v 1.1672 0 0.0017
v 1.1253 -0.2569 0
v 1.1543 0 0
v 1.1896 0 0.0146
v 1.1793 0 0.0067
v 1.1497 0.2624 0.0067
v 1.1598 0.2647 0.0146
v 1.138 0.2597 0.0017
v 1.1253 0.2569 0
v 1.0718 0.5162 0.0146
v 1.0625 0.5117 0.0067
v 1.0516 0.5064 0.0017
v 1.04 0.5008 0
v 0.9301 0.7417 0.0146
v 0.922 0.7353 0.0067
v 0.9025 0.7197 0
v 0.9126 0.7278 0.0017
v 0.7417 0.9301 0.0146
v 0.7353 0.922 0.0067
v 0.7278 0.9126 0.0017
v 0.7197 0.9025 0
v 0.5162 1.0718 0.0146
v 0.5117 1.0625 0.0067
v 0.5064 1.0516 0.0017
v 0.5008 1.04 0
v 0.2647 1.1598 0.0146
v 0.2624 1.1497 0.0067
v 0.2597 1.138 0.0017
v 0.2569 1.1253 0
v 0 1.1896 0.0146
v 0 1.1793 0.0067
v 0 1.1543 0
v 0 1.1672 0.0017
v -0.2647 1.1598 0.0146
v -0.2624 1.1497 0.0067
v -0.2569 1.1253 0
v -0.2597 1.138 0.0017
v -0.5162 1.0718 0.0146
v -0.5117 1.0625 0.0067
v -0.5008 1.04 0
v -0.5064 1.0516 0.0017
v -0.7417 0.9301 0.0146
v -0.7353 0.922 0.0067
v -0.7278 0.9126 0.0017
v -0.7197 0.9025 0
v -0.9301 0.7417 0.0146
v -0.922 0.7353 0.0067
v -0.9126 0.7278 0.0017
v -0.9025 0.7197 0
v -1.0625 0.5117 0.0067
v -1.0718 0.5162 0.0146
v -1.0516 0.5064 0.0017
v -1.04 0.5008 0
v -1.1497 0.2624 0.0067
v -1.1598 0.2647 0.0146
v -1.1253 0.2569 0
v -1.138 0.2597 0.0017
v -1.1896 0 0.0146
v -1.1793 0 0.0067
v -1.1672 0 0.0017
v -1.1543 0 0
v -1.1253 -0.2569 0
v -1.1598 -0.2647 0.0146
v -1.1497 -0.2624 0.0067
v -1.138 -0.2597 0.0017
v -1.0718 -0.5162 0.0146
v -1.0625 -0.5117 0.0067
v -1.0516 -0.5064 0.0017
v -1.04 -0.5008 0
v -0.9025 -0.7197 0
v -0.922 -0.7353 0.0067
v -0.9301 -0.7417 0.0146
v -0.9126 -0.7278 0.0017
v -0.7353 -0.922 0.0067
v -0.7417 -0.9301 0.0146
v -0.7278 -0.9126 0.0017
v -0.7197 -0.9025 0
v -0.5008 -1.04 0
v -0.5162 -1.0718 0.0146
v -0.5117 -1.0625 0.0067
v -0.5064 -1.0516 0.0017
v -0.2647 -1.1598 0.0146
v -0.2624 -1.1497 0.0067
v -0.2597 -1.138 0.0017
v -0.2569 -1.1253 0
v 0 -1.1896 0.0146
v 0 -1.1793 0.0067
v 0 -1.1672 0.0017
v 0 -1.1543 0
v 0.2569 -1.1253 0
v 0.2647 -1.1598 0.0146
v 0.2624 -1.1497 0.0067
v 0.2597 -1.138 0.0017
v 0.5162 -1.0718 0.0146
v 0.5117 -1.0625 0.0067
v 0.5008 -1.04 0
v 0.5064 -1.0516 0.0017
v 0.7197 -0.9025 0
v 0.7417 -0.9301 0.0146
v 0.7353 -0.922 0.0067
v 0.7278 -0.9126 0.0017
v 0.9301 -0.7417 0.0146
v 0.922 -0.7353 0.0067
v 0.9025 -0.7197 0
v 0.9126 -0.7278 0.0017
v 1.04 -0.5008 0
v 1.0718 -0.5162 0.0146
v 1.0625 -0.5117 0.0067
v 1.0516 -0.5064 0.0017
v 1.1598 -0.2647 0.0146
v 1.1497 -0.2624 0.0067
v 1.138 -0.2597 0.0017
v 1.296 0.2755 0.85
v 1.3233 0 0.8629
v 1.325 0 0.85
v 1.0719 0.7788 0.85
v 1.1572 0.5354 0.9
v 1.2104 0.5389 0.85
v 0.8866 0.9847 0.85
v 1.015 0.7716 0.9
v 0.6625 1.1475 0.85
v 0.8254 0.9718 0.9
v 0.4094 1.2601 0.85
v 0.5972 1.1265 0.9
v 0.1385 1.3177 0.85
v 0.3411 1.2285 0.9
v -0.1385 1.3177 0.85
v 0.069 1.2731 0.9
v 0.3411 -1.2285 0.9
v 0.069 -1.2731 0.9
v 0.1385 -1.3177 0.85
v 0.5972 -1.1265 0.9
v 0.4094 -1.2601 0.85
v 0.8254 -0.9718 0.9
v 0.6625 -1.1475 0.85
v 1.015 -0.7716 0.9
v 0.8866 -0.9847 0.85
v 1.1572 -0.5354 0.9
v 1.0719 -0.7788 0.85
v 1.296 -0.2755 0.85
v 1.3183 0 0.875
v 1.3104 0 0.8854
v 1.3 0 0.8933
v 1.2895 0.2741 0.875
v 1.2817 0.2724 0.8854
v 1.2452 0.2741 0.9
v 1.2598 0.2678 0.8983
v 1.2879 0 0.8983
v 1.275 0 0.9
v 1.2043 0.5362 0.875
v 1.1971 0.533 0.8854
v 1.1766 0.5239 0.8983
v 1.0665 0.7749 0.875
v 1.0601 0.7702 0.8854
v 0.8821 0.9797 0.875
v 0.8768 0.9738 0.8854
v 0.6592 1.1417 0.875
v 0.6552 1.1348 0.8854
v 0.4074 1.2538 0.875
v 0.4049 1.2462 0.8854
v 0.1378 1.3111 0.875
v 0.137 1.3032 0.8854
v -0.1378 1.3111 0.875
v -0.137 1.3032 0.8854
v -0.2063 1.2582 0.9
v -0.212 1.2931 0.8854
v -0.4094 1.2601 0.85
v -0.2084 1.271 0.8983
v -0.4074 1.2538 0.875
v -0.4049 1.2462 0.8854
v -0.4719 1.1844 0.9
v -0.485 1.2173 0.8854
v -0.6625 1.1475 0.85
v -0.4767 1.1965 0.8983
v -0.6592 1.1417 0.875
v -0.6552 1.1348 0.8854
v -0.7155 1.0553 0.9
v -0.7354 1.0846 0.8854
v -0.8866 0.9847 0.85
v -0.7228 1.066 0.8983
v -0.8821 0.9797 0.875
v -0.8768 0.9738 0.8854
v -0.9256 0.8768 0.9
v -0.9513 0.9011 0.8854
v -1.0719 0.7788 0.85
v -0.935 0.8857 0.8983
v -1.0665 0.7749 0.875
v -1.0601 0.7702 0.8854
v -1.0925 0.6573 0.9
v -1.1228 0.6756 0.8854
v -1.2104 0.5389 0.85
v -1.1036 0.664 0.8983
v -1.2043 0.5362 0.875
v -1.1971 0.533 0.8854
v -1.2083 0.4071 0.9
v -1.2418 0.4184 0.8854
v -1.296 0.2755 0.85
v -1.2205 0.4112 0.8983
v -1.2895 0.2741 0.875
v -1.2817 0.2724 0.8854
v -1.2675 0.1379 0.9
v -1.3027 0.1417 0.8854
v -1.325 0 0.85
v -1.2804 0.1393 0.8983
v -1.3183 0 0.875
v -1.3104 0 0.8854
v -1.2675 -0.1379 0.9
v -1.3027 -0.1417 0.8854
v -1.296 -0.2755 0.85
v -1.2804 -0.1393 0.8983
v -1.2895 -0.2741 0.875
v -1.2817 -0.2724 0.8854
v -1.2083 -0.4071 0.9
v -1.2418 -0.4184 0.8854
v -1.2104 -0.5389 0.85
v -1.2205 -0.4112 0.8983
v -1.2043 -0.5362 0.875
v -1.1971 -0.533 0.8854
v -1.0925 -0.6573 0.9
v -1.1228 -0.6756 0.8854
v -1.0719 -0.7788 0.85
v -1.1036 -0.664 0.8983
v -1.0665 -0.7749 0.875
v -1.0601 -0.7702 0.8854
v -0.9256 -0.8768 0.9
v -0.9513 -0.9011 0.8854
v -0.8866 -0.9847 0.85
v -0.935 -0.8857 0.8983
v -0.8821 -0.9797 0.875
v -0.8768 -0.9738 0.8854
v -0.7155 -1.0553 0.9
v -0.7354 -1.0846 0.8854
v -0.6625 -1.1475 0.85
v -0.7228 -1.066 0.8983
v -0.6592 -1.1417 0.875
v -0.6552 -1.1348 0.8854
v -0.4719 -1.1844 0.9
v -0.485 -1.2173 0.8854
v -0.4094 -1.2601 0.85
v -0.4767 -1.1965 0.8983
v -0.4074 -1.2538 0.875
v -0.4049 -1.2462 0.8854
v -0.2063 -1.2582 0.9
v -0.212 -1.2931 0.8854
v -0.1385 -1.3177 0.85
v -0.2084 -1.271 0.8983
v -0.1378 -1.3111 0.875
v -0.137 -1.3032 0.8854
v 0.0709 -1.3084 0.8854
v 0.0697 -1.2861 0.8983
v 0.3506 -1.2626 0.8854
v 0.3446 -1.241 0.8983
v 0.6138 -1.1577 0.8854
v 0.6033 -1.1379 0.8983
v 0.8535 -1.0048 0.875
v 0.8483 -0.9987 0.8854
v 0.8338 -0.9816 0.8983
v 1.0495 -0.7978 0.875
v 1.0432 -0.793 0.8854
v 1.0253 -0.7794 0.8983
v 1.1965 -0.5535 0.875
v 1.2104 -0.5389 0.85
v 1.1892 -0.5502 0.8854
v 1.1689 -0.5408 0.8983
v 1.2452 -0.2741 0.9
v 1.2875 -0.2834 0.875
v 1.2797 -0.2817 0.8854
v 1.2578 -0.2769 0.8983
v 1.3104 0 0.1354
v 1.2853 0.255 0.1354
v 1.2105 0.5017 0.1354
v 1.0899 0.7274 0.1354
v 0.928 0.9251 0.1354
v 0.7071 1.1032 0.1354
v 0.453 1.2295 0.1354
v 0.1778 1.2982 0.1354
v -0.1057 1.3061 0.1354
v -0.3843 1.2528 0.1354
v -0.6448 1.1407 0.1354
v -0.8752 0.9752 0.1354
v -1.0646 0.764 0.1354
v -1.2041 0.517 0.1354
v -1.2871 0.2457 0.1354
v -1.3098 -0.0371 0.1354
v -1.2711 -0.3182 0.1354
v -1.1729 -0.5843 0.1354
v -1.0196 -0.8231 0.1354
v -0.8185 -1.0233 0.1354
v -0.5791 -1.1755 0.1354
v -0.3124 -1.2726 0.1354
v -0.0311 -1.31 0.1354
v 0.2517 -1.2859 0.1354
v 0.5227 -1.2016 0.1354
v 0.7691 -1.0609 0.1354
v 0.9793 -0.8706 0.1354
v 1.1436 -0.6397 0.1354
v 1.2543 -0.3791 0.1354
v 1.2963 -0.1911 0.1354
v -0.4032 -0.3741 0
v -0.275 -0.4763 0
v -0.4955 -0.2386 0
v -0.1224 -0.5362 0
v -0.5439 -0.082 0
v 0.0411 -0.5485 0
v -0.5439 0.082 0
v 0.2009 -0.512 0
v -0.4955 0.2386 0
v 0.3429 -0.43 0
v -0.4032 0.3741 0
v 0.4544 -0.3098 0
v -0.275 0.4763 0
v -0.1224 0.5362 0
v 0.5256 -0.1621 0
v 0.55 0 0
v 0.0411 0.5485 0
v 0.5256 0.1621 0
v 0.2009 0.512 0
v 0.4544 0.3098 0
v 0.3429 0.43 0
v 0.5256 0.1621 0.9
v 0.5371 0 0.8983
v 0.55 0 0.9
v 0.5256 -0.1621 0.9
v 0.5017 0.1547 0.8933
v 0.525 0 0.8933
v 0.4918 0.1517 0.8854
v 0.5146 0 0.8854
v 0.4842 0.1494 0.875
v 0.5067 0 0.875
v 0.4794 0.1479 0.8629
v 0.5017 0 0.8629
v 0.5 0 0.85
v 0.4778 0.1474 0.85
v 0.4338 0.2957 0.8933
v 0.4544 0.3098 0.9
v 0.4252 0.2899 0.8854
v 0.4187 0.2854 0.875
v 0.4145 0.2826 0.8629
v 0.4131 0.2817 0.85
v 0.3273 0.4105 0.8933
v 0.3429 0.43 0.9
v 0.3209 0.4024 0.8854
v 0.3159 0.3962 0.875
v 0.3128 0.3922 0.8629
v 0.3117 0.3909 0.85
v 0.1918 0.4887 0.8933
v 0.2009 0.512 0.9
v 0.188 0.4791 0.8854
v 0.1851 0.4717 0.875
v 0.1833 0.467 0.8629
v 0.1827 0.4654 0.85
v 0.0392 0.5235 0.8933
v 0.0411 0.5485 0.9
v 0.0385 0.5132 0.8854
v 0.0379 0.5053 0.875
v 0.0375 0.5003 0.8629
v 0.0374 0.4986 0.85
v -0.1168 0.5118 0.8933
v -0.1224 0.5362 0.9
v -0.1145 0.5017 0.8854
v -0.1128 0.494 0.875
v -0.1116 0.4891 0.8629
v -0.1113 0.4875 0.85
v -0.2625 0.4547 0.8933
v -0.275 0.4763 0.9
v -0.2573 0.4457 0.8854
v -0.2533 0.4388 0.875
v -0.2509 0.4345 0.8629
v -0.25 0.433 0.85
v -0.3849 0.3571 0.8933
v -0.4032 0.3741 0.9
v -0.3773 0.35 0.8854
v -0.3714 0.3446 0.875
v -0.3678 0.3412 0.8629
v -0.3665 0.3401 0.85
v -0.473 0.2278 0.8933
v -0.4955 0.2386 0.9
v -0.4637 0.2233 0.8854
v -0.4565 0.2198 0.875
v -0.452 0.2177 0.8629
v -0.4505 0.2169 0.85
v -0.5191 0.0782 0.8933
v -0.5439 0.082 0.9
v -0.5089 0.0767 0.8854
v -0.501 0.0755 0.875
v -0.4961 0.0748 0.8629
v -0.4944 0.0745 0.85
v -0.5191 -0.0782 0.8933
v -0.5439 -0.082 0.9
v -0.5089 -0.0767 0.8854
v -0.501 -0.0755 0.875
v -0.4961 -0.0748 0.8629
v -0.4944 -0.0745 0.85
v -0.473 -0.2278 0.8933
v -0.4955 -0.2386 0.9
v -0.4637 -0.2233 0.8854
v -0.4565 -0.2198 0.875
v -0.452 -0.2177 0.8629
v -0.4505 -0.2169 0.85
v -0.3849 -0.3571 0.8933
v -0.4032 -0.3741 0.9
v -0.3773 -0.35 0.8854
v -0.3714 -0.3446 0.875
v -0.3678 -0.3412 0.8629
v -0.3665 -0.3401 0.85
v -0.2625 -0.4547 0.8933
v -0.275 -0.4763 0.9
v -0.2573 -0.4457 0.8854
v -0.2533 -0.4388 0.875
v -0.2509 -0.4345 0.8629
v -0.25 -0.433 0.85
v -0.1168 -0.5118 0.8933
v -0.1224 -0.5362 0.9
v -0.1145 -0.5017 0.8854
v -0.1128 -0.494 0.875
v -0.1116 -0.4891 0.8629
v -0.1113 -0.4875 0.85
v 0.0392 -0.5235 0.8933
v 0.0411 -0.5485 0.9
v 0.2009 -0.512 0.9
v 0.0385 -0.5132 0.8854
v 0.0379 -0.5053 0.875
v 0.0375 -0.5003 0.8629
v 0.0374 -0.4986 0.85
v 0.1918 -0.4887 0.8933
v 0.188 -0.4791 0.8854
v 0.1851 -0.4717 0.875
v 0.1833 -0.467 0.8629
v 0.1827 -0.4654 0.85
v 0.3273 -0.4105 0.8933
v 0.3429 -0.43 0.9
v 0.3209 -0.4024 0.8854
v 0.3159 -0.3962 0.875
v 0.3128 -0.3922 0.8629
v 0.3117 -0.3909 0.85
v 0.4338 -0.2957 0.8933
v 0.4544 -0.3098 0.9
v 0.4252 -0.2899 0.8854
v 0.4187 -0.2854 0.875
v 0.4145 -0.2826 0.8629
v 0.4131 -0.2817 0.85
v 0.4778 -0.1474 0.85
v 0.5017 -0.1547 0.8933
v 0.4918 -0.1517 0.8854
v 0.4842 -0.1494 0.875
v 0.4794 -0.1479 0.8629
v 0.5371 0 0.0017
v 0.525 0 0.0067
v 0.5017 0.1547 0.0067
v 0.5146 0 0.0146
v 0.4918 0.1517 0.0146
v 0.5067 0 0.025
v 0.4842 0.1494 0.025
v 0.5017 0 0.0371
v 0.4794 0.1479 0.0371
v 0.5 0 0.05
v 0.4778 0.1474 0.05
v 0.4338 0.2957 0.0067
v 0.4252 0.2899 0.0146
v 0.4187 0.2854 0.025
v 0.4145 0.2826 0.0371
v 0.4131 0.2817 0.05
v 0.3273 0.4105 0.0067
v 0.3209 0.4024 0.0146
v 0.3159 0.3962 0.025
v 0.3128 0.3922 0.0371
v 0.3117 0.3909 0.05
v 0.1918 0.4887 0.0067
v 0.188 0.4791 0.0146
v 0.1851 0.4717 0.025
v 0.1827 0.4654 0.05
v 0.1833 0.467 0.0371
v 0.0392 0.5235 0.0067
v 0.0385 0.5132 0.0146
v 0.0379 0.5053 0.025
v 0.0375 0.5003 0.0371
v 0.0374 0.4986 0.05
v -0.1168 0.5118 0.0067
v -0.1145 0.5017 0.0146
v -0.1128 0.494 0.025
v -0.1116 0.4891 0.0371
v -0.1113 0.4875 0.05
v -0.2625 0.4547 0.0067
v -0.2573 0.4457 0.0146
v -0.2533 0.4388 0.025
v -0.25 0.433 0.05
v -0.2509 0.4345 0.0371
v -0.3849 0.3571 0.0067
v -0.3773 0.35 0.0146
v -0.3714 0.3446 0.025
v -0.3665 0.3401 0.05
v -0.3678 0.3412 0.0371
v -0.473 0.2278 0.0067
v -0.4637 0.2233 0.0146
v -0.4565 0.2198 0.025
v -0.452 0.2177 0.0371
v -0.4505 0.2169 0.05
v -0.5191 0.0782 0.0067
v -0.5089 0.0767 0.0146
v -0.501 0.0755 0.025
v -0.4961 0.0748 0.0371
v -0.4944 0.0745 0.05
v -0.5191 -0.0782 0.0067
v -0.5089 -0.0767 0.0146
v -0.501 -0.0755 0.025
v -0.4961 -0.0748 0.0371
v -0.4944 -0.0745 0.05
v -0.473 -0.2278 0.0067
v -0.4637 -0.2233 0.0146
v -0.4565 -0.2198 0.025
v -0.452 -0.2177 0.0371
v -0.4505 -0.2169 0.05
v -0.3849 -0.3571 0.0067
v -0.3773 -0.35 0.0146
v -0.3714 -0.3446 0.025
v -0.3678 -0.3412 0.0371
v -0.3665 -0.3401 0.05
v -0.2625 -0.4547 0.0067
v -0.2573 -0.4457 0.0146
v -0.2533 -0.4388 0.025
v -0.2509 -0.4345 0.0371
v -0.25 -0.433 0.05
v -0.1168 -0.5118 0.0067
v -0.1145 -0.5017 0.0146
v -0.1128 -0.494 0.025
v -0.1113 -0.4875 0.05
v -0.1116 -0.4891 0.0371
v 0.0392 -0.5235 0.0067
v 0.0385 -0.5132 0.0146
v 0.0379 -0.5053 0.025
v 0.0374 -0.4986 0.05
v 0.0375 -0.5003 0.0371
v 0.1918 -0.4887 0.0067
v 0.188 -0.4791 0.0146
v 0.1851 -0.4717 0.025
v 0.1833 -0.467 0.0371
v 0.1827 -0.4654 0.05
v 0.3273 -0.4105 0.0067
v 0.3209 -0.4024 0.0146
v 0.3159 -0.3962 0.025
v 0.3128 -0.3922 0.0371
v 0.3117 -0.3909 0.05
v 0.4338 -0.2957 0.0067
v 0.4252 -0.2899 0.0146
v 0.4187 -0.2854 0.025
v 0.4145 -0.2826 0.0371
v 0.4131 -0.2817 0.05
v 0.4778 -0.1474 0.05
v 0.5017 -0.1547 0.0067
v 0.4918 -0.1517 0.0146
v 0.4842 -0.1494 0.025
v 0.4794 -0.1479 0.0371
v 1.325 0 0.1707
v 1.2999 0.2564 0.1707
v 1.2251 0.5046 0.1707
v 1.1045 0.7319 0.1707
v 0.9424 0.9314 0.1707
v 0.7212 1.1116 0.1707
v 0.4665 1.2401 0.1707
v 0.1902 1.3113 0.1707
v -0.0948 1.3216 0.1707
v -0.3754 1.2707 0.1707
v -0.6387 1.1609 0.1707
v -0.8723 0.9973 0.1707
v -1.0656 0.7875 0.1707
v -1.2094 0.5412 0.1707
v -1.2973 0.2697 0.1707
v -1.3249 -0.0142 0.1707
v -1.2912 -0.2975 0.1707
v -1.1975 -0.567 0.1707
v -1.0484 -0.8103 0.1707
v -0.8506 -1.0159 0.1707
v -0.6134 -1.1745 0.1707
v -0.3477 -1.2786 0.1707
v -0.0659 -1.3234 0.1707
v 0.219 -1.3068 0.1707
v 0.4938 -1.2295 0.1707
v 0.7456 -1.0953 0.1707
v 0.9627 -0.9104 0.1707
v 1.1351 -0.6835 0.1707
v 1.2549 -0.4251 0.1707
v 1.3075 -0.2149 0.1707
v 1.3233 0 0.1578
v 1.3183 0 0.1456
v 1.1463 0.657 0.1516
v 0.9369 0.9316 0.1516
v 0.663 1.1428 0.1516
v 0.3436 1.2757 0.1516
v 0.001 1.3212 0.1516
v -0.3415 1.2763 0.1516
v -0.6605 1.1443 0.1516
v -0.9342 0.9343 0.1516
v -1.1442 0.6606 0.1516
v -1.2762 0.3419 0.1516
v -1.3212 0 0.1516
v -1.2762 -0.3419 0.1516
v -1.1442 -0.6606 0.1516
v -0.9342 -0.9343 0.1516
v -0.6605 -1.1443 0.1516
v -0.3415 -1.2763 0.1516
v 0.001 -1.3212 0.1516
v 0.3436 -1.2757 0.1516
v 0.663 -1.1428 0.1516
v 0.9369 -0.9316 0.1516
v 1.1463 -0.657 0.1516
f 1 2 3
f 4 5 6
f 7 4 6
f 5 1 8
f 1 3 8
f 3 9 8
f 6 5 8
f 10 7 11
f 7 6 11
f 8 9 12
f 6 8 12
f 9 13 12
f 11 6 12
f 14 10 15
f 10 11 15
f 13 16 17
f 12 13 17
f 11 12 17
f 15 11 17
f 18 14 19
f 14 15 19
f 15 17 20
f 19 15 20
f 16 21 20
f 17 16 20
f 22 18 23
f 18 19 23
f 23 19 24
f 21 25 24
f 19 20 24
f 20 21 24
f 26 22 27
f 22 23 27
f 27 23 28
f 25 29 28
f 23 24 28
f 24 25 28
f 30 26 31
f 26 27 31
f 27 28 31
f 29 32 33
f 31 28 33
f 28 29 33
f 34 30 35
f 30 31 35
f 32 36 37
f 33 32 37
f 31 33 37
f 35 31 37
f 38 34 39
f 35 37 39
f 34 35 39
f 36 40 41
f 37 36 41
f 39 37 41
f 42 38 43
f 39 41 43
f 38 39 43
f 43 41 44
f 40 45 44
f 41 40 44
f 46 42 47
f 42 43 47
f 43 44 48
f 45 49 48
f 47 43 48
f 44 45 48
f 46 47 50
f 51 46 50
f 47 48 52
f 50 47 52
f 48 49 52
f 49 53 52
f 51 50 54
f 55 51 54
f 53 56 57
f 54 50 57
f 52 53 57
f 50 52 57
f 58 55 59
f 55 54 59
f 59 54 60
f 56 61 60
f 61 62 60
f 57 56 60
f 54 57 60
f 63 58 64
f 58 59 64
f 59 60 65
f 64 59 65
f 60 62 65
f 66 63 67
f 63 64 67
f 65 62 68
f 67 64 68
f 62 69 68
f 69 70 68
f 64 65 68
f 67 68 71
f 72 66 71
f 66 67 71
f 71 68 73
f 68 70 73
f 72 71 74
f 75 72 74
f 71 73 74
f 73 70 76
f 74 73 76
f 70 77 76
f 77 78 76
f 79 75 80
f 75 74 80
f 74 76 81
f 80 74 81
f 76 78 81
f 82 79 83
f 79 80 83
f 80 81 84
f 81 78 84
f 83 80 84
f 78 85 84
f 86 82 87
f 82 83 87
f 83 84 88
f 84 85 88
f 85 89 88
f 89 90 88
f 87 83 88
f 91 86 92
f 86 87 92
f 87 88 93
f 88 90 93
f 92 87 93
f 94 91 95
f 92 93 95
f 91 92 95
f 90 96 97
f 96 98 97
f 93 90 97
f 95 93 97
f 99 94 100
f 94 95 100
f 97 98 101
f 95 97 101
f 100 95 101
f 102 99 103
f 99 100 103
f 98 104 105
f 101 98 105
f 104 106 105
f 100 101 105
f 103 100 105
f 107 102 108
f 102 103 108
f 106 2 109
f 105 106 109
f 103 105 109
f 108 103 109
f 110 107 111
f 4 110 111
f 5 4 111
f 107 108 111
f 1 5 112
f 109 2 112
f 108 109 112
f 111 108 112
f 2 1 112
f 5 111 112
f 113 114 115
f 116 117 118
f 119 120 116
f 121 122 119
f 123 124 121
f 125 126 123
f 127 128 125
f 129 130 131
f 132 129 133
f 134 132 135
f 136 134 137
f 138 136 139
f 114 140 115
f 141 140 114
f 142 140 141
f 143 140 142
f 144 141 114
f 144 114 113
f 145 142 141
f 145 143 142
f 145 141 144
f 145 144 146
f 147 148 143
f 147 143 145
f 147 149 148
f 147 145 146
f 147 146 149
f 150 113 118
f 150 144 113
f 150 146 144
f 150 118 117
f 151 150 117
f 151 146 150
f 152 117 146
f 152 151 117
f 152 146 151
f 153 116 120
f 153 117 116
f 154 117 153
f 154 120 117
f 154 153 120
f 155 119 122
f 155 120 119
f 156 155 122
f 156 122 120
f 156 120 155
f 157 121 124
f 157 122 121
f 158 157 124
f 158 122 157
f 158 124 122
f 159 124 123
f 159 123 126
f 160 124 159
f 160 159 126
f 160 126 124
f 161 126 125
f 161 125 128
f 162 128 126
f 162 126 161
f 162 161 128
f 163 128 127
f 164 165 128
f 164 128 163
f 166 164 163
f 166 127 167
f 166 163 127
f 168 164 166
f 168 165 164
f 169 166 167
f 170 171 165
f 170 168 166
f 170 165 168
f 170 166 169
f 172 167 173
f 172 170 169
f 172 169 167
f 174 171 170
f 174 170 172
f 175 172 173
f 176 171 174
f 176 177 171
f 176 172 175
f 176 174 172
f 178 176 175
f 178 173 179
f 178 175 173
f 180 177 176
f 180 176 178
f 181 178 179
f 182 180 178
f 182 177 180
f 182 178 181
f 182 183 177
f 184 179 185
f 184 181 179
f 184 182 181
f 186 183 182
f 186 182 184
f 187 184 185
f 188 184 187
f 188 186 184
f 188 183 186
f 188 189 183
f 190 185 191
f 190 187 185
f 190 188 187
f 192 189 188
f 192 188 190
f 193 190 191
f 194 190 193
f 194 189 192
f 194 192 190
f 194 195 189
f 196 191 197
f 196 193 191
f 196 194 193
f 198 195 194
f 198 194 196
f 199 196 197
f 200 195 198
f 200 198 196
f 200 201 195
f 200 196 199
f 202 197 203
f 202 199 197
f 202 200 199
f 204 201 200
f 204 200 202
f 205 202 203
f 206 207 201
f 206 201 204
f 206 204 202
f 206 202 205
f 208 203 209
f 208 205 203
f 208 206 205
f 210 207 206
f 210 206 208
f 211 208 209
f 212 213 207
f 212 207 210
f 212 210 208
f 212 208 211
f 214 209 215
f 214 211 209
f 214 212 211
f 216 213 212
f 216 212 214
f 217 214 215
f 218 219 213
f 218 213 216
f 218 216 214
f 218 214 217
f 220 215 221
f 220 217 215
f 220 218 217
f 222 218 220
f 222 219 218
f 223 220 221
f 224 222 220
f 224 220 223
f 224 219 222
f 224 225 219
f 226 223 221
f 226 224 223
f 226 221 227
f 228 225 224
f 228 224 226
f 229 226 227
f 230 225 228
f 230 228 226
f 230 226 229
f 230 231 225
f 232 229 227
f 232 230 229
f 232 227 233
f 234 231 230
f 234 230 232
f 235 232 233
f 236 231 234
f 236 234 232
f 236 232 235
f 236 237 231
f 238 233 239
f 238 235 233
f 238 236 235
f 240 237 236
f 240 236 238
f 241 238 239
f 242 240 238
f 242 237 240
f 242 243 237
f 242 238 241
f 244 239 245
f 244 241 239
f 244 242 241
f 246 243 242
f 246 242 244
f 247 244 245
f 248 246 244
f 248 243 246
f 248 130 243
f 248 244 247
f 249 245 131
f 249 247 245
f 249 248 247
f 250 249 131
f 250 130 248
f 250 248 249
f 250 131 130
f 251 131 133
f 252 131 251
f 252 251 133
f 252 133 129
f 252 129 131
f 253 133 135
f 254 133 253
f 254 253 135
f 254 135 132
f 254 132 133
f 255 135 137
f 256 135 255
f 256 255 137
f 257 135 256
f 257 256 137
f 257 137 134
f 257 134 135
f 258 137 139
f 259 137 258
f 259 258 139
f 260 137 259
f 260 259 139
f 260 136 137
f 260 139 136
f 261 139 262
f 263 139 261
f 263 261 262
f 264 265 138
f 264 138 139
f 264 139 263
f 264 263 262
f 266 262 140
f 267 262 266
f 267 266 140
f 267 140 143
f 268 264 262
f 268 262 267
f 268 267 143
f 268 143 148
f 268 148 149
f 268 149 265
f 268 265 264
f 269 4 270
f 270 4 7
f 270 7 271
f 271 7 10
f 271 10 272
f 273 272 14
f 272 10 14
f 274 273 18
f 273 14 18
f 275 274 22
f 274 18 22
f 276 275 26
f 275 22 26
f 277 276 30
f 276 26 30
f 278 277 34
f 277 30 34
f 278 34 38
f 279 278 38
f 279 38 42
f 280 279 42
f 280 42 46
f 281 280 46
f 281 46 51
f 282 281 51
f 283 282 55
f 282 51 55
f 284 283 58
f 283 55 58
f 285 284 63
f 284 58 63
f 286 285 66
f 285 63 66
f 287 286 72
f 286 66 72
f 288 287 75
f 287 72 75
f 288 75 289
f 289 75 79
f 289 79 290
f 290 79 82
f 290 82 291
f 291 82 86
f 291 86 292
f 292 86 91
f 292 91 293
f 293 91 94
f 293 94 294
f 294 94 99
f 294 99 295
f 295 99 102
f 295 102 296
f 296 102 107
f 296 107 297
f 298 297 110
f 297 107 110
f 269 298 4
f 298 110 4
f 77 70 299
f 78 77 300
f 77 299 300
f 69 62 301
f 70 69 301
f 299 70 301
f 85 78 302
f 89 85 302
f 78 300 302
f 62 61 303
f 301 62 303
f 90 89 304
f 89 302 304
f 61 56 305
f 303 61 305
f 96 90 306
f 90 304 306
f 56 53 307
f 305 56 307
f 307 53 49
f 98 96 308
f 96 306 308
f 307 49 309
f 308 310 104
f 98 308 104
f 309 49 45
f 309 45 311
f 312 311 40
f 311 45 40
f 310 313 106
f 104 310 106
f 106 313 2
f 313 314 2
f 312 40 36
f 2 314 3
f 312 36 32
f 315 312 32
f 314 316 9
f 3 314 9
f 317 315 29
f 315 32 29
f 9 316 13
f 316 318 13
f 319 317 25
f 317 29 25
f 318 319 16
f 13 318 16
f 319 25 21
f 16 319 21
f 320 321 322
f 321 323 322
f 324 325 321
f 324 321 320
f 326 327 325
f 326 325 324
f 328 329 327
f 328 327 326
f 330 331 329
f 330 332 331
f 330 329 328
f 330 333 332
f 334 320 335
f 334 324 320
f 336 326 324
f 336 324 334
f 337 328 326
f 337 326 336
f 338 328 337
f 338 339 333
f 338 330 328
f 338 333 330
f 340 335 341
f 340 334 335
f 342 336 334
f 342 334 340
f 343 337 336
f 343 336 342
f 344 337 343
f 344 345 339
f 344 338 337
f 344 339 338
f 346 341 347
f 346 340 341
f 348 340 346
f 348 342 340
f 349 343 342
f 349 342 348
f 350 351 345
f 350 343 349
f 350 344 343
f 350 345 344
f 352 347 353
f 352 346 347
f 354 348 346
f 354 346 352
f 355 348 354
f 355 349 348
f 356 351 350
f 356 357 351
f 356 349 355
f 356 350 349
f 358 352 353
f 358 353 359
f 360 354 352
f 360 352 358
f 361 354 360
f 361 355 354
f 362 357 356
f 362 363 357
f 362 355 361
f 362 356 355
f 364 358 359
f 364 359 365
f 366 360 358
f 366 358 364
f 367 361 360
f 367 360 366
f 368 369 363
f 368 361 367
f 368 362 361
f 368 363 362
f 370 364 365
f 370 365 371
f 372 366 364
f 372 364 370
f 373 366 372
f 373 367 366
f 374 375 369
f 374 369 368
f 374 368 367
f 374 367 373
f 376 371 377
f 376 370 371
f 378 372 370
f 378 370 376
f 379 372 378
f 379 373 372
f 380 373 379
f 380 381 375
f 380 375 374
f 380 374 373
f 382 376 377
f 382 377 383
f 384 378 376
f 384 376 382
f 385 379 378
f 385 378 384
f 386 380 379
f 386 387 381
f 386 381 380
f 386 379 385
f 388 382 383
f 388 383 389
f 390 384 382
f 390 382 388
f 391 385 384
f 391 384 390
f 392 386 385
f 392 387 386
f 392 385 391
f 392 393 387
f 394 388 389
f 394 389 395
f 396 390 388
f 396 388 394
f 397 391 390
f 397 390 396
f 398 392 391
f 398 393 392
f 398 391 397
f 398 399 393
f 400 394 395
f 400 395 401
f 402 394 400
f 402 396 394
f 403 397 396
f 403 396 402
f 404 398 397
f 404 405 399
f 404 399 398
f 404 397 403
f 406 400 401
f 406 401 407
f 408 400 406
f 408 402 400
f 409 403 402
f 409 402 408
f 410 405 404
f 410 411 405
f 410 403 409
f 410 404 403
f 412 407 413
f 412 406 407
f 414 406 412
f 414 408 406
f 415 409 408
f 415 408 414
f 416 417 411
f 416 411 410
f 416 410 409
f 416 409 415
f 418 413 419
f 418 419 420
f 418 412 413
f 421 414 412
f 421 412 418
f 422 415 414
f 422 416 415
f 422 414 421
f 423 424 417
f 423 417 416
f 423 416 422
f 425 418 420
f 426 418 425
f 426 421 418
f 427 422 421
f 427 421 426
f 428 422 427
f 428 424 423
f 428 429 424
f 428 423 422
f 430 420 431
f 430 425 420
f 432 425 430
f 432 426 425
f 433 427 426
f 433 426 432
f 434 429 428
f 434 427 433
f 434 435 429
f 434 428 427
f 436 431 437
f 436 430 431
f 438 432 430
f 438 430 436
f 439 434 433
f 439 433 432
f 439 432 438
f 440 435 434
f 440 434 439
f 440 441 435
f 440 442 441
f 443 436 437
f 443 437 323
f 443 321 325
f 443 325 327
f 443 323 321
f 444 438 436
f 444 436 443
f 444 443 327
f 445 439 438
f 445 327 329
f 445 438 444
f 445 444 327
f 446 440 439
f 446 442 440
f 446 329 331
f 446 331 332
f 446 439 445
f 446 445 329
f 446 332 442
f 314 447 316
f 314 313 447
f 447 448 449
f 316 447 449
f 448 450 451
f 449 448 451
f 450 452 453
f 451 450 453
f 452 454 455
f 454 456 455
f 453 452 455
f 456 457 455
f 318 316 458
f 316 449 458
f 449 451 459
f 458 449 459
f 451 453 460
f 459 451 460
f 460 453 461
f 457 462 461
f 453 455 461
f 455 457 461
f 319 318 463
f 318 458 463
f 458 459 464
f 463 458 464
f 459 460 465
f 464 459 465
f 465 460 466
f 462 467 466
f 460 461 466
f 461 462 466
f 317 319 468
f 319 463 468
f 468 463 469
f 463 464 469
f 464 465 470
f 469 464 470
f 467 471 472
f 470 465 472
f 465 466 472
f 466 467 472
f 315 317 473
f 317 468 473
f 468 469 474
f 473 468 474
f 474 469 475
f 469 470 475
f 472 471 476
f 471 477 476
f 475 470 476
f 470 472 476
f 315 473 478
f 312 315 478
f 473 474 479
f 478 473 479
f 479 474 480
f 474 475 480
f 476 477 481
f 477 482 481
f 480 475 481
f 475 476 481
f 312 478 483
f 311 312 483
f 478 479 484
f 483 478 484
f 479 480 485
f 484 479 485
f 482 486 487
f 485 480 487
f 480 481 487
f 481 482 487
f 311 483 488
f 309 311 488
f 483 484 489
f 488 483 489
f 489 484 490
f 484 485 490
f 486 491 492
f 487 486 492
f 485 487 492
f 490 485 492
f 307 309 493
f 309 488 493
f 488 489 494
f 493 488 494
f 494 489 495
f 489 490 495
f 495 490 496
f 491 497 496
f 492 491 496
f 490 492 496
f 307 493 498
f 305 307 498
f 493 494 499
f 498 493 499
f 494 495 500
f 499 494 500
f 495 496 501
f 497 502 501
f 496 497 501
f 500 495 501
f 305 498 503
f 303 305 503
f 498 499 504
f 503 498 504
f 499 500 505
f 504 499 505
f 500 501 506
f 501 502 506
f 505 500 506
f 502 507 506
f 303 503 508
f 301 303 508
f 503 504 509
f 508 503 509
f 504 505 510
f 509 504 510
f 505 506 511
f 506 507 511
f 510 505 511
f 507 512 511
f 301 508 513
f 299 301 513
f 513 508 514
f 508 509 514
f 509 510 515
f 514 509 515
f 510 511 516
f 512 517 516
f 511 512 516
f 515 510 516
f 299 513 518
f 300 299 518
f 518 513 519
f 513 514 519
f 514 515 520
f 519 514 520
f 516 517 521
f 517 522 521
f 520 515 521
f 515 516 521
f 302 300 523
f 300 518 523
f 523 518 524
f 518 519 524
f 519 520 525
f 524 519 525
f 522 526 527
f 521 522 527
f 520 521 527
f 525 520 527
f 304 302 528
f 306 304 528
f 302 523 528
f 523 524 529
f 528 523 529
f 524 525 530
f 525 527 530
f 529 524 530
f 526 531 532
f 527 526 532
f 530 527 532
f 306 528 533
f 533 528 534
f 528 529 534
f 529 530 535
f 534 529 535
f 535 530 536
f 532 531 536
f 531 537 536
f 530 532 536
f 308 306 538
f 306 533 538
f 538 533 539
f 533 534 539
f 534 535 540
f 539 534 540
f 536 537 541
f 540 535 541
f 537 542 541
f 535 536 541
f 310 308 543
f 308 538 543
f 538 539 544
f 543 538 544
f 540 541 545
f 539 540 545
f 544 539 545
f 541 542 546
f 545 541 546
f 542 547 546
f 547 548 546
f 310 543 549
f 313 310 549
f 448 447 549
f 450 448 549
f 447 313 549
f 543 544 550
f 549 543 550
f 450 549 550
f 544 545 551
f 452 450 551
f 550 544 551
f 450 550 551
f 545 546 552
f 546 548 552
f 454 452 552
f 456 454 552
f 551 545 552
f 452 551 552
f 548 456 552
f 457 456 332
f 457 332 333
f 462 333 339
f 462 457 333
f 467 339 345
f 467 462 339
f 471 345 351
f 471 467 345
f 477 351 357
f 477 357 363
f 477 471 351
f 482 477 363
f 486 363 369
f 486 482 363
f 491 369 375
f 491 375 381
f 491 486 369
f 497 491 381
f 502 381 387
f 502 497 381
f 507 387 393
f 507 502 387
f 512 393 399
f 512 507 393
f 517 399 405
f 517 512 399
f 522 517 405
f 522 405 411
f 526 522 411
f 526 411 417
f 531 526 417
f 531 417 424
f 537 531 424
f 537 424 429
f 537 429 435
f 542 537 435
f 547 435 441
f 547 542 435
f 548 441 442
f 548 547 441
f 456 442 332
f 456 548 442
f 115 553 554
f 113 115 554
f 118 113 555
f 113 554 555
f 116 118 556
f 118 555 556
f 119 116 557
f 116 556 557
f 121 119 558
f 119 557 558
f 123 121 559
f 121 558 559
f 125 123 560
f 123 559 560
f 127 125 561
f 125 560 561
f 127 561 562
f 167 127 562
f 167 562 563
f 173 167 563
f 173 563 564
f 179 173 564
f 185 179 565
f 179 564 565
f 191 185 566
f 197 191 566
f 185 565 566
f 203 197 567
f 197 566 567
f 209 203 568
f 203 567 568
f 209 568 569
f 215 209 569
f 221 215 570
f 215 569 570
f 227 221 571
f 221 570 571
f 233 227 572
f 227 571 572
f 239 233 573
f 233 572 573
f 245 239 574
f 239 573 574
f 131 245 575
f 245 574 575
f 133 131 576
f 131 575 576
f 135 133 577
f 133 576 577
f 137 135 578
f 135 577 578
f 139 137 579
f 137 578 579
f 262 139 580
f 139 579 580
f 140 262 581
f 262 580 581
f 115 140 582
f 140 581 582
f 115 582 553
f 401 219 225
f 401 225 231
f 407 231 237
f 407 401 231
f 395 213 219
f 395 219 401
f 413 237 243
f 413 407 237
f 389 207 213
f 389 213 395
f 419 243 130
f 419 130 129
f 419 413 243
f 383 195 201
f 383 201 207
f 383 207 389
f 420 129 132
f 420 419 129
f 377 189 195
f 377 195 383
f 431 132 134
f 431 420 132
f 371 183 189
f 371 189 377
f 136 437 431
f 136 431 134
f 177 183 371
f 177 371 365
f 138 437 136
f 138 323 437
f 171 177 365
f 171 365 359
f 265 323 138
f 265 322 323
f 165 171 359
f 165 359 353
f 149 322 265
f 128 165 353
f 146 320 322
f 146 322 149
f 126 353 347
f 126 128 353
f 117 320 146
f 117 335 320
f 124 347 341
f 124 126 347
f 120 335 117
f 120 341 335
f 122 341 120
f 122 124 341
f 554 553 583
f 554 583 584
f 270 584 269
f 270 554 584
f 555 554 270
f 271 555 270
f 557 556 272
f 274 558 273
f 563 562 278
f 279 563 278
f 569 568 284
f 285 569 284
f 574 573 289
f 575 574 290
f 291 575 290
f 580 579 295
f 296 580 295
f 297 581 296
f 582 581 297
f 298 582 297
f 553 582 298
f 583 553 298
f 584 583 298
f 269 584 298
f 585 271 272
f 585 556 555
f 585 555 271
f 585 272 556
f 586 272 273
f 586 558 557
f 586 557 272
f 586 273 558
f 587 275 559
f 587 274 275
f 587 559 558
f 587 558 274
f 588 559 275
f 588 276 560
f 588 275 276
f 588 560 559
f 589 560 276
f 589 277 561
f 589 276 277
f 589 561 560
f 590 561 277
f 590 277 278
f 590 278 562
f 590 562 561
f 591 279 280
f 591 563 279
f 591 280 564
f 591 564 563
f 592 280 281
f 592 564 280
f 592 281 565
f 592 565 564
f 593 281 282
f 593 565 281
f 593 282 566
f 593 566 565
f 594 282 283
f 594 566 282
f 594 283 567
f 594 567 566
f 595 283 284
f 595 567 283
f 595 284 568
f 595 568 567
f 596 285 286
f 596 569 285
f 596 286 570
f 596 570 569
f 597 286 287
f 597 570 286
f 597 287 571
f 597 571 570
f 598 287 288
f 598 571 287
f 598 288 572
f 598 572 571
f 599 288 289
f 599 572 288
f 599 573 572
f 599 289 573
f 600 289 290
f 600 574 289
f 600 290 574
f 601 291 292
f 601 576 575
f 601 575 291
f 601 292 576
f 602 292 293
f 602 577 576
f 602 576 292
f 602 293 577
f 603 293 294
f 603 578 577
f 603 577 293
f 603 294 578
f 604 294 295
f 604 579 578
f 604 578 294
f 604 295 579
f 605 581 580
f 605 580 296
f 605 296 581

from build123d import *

# Parameters (mm, degrees)
SKETCH1_R           = 1.325
SKETCH1_R_2         = 0.5
BOSS_EXTRUDE1_DEPTH = 0.9
CHAMFER1_SIZE       = 0.15
FILLET1_R           = 0.05


with BuildPart() as part:
    # Sketch1 → Boss-Extrude1 (new body)
    with BuildSketch(Plane.XY):
        Circle(SKETCH1_R)
        Circle(SKETCH1_R_2, mode=Mode.SUBTRACT)
    extrude(amount=BOSS_EXTRUDE1_DEPTH)

    # Chamfer1
    chamfer1_edges = [part.edges().sort_by_distance(p)[0] for p in [
        (-1.325, 0, 0),
    ]]
    chamfer(chamfer1_edges, length=CHAMFER1_SIZE)

    # Fillet1
    fillet1_edges = [part.edges().sort_by_distance(p)[0] for p in [
        (-1.175, 0, 0),
        (-1.325, 0, 0.9),
        (-0.5, 0, 0),
        (-0.5, 0, 0.9),
        (-1.325, 0, 0.15),
    ]]
    fillet(fillet1_edges, radius=FILLET1_R)


solid = part.part
